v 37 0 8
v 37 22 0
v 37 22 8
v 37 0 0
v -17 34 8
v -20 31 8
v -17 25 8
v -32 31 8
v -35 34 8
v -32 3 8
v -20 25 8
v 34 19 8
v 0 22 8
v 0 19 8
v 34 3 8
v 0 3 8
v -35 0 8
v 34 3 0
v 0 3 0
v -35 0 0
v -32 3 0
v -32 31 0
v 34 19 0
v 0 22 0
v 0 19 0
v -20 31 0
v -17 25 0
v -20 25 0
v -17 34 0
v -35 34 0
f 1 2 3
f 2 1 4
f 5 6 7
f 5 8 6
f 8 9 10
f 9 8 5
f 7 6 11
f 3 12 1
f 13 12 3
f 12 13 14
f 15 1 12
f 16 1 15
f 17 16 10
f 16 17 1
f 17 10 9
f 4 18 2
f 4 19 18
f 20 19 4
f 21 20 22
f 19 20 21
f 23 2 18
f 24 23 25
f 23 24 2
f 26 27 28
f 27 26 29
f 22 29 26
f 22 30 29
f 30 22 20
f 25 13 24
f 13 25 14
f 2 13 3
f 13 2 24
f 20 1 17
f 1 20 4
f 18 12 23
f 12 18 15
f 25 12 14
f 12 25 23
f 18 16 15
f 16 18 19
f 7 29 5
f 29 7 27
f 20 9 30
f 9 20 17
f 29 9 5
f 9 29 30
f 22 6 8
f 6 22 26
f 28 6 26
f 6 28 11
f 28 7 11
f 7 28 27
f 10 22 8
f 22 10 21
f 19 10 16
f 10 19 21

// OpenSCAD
width = 8;

height = 31 + 3;
length = 16;
innerHeight = 3;

holderHigh = 35;
holderReturn = 15;
holderSecure = 6;

screw = 4;



union()  {
    difference()  {
        cube([height + innerHeight, length + innerHeight * 2, width]);

        translate([0, innerHeight, 0]) cube([height, length, width]);

        //translate([innerHeight + 1, 0, width / 2]) rotate([-90, 0 ,0]) cylinder(d = screw, h = length + innerHeight * 2, $fn = 50);
    }

    translate([-(holderHigh), 0, 0]) {
        union() {
            cube([holderHigh, innerHeight, width]);

            translate([0, innerHeight, 0]) {
                union() {
                    cube([innerHeight, length + innerHeight + 10, width]);

                    translate([0, holderReturn + innerHeight + 10, 0]) {
                        union() {
                            cube([holderReturn + innerHeight, innerHeight, width]);

                            translate([holderReturn, -(holderSecure), 0]) cube([innerHeight, holderSecure, width]);
                        }
                    }
                }
            }
        }
    }
}
